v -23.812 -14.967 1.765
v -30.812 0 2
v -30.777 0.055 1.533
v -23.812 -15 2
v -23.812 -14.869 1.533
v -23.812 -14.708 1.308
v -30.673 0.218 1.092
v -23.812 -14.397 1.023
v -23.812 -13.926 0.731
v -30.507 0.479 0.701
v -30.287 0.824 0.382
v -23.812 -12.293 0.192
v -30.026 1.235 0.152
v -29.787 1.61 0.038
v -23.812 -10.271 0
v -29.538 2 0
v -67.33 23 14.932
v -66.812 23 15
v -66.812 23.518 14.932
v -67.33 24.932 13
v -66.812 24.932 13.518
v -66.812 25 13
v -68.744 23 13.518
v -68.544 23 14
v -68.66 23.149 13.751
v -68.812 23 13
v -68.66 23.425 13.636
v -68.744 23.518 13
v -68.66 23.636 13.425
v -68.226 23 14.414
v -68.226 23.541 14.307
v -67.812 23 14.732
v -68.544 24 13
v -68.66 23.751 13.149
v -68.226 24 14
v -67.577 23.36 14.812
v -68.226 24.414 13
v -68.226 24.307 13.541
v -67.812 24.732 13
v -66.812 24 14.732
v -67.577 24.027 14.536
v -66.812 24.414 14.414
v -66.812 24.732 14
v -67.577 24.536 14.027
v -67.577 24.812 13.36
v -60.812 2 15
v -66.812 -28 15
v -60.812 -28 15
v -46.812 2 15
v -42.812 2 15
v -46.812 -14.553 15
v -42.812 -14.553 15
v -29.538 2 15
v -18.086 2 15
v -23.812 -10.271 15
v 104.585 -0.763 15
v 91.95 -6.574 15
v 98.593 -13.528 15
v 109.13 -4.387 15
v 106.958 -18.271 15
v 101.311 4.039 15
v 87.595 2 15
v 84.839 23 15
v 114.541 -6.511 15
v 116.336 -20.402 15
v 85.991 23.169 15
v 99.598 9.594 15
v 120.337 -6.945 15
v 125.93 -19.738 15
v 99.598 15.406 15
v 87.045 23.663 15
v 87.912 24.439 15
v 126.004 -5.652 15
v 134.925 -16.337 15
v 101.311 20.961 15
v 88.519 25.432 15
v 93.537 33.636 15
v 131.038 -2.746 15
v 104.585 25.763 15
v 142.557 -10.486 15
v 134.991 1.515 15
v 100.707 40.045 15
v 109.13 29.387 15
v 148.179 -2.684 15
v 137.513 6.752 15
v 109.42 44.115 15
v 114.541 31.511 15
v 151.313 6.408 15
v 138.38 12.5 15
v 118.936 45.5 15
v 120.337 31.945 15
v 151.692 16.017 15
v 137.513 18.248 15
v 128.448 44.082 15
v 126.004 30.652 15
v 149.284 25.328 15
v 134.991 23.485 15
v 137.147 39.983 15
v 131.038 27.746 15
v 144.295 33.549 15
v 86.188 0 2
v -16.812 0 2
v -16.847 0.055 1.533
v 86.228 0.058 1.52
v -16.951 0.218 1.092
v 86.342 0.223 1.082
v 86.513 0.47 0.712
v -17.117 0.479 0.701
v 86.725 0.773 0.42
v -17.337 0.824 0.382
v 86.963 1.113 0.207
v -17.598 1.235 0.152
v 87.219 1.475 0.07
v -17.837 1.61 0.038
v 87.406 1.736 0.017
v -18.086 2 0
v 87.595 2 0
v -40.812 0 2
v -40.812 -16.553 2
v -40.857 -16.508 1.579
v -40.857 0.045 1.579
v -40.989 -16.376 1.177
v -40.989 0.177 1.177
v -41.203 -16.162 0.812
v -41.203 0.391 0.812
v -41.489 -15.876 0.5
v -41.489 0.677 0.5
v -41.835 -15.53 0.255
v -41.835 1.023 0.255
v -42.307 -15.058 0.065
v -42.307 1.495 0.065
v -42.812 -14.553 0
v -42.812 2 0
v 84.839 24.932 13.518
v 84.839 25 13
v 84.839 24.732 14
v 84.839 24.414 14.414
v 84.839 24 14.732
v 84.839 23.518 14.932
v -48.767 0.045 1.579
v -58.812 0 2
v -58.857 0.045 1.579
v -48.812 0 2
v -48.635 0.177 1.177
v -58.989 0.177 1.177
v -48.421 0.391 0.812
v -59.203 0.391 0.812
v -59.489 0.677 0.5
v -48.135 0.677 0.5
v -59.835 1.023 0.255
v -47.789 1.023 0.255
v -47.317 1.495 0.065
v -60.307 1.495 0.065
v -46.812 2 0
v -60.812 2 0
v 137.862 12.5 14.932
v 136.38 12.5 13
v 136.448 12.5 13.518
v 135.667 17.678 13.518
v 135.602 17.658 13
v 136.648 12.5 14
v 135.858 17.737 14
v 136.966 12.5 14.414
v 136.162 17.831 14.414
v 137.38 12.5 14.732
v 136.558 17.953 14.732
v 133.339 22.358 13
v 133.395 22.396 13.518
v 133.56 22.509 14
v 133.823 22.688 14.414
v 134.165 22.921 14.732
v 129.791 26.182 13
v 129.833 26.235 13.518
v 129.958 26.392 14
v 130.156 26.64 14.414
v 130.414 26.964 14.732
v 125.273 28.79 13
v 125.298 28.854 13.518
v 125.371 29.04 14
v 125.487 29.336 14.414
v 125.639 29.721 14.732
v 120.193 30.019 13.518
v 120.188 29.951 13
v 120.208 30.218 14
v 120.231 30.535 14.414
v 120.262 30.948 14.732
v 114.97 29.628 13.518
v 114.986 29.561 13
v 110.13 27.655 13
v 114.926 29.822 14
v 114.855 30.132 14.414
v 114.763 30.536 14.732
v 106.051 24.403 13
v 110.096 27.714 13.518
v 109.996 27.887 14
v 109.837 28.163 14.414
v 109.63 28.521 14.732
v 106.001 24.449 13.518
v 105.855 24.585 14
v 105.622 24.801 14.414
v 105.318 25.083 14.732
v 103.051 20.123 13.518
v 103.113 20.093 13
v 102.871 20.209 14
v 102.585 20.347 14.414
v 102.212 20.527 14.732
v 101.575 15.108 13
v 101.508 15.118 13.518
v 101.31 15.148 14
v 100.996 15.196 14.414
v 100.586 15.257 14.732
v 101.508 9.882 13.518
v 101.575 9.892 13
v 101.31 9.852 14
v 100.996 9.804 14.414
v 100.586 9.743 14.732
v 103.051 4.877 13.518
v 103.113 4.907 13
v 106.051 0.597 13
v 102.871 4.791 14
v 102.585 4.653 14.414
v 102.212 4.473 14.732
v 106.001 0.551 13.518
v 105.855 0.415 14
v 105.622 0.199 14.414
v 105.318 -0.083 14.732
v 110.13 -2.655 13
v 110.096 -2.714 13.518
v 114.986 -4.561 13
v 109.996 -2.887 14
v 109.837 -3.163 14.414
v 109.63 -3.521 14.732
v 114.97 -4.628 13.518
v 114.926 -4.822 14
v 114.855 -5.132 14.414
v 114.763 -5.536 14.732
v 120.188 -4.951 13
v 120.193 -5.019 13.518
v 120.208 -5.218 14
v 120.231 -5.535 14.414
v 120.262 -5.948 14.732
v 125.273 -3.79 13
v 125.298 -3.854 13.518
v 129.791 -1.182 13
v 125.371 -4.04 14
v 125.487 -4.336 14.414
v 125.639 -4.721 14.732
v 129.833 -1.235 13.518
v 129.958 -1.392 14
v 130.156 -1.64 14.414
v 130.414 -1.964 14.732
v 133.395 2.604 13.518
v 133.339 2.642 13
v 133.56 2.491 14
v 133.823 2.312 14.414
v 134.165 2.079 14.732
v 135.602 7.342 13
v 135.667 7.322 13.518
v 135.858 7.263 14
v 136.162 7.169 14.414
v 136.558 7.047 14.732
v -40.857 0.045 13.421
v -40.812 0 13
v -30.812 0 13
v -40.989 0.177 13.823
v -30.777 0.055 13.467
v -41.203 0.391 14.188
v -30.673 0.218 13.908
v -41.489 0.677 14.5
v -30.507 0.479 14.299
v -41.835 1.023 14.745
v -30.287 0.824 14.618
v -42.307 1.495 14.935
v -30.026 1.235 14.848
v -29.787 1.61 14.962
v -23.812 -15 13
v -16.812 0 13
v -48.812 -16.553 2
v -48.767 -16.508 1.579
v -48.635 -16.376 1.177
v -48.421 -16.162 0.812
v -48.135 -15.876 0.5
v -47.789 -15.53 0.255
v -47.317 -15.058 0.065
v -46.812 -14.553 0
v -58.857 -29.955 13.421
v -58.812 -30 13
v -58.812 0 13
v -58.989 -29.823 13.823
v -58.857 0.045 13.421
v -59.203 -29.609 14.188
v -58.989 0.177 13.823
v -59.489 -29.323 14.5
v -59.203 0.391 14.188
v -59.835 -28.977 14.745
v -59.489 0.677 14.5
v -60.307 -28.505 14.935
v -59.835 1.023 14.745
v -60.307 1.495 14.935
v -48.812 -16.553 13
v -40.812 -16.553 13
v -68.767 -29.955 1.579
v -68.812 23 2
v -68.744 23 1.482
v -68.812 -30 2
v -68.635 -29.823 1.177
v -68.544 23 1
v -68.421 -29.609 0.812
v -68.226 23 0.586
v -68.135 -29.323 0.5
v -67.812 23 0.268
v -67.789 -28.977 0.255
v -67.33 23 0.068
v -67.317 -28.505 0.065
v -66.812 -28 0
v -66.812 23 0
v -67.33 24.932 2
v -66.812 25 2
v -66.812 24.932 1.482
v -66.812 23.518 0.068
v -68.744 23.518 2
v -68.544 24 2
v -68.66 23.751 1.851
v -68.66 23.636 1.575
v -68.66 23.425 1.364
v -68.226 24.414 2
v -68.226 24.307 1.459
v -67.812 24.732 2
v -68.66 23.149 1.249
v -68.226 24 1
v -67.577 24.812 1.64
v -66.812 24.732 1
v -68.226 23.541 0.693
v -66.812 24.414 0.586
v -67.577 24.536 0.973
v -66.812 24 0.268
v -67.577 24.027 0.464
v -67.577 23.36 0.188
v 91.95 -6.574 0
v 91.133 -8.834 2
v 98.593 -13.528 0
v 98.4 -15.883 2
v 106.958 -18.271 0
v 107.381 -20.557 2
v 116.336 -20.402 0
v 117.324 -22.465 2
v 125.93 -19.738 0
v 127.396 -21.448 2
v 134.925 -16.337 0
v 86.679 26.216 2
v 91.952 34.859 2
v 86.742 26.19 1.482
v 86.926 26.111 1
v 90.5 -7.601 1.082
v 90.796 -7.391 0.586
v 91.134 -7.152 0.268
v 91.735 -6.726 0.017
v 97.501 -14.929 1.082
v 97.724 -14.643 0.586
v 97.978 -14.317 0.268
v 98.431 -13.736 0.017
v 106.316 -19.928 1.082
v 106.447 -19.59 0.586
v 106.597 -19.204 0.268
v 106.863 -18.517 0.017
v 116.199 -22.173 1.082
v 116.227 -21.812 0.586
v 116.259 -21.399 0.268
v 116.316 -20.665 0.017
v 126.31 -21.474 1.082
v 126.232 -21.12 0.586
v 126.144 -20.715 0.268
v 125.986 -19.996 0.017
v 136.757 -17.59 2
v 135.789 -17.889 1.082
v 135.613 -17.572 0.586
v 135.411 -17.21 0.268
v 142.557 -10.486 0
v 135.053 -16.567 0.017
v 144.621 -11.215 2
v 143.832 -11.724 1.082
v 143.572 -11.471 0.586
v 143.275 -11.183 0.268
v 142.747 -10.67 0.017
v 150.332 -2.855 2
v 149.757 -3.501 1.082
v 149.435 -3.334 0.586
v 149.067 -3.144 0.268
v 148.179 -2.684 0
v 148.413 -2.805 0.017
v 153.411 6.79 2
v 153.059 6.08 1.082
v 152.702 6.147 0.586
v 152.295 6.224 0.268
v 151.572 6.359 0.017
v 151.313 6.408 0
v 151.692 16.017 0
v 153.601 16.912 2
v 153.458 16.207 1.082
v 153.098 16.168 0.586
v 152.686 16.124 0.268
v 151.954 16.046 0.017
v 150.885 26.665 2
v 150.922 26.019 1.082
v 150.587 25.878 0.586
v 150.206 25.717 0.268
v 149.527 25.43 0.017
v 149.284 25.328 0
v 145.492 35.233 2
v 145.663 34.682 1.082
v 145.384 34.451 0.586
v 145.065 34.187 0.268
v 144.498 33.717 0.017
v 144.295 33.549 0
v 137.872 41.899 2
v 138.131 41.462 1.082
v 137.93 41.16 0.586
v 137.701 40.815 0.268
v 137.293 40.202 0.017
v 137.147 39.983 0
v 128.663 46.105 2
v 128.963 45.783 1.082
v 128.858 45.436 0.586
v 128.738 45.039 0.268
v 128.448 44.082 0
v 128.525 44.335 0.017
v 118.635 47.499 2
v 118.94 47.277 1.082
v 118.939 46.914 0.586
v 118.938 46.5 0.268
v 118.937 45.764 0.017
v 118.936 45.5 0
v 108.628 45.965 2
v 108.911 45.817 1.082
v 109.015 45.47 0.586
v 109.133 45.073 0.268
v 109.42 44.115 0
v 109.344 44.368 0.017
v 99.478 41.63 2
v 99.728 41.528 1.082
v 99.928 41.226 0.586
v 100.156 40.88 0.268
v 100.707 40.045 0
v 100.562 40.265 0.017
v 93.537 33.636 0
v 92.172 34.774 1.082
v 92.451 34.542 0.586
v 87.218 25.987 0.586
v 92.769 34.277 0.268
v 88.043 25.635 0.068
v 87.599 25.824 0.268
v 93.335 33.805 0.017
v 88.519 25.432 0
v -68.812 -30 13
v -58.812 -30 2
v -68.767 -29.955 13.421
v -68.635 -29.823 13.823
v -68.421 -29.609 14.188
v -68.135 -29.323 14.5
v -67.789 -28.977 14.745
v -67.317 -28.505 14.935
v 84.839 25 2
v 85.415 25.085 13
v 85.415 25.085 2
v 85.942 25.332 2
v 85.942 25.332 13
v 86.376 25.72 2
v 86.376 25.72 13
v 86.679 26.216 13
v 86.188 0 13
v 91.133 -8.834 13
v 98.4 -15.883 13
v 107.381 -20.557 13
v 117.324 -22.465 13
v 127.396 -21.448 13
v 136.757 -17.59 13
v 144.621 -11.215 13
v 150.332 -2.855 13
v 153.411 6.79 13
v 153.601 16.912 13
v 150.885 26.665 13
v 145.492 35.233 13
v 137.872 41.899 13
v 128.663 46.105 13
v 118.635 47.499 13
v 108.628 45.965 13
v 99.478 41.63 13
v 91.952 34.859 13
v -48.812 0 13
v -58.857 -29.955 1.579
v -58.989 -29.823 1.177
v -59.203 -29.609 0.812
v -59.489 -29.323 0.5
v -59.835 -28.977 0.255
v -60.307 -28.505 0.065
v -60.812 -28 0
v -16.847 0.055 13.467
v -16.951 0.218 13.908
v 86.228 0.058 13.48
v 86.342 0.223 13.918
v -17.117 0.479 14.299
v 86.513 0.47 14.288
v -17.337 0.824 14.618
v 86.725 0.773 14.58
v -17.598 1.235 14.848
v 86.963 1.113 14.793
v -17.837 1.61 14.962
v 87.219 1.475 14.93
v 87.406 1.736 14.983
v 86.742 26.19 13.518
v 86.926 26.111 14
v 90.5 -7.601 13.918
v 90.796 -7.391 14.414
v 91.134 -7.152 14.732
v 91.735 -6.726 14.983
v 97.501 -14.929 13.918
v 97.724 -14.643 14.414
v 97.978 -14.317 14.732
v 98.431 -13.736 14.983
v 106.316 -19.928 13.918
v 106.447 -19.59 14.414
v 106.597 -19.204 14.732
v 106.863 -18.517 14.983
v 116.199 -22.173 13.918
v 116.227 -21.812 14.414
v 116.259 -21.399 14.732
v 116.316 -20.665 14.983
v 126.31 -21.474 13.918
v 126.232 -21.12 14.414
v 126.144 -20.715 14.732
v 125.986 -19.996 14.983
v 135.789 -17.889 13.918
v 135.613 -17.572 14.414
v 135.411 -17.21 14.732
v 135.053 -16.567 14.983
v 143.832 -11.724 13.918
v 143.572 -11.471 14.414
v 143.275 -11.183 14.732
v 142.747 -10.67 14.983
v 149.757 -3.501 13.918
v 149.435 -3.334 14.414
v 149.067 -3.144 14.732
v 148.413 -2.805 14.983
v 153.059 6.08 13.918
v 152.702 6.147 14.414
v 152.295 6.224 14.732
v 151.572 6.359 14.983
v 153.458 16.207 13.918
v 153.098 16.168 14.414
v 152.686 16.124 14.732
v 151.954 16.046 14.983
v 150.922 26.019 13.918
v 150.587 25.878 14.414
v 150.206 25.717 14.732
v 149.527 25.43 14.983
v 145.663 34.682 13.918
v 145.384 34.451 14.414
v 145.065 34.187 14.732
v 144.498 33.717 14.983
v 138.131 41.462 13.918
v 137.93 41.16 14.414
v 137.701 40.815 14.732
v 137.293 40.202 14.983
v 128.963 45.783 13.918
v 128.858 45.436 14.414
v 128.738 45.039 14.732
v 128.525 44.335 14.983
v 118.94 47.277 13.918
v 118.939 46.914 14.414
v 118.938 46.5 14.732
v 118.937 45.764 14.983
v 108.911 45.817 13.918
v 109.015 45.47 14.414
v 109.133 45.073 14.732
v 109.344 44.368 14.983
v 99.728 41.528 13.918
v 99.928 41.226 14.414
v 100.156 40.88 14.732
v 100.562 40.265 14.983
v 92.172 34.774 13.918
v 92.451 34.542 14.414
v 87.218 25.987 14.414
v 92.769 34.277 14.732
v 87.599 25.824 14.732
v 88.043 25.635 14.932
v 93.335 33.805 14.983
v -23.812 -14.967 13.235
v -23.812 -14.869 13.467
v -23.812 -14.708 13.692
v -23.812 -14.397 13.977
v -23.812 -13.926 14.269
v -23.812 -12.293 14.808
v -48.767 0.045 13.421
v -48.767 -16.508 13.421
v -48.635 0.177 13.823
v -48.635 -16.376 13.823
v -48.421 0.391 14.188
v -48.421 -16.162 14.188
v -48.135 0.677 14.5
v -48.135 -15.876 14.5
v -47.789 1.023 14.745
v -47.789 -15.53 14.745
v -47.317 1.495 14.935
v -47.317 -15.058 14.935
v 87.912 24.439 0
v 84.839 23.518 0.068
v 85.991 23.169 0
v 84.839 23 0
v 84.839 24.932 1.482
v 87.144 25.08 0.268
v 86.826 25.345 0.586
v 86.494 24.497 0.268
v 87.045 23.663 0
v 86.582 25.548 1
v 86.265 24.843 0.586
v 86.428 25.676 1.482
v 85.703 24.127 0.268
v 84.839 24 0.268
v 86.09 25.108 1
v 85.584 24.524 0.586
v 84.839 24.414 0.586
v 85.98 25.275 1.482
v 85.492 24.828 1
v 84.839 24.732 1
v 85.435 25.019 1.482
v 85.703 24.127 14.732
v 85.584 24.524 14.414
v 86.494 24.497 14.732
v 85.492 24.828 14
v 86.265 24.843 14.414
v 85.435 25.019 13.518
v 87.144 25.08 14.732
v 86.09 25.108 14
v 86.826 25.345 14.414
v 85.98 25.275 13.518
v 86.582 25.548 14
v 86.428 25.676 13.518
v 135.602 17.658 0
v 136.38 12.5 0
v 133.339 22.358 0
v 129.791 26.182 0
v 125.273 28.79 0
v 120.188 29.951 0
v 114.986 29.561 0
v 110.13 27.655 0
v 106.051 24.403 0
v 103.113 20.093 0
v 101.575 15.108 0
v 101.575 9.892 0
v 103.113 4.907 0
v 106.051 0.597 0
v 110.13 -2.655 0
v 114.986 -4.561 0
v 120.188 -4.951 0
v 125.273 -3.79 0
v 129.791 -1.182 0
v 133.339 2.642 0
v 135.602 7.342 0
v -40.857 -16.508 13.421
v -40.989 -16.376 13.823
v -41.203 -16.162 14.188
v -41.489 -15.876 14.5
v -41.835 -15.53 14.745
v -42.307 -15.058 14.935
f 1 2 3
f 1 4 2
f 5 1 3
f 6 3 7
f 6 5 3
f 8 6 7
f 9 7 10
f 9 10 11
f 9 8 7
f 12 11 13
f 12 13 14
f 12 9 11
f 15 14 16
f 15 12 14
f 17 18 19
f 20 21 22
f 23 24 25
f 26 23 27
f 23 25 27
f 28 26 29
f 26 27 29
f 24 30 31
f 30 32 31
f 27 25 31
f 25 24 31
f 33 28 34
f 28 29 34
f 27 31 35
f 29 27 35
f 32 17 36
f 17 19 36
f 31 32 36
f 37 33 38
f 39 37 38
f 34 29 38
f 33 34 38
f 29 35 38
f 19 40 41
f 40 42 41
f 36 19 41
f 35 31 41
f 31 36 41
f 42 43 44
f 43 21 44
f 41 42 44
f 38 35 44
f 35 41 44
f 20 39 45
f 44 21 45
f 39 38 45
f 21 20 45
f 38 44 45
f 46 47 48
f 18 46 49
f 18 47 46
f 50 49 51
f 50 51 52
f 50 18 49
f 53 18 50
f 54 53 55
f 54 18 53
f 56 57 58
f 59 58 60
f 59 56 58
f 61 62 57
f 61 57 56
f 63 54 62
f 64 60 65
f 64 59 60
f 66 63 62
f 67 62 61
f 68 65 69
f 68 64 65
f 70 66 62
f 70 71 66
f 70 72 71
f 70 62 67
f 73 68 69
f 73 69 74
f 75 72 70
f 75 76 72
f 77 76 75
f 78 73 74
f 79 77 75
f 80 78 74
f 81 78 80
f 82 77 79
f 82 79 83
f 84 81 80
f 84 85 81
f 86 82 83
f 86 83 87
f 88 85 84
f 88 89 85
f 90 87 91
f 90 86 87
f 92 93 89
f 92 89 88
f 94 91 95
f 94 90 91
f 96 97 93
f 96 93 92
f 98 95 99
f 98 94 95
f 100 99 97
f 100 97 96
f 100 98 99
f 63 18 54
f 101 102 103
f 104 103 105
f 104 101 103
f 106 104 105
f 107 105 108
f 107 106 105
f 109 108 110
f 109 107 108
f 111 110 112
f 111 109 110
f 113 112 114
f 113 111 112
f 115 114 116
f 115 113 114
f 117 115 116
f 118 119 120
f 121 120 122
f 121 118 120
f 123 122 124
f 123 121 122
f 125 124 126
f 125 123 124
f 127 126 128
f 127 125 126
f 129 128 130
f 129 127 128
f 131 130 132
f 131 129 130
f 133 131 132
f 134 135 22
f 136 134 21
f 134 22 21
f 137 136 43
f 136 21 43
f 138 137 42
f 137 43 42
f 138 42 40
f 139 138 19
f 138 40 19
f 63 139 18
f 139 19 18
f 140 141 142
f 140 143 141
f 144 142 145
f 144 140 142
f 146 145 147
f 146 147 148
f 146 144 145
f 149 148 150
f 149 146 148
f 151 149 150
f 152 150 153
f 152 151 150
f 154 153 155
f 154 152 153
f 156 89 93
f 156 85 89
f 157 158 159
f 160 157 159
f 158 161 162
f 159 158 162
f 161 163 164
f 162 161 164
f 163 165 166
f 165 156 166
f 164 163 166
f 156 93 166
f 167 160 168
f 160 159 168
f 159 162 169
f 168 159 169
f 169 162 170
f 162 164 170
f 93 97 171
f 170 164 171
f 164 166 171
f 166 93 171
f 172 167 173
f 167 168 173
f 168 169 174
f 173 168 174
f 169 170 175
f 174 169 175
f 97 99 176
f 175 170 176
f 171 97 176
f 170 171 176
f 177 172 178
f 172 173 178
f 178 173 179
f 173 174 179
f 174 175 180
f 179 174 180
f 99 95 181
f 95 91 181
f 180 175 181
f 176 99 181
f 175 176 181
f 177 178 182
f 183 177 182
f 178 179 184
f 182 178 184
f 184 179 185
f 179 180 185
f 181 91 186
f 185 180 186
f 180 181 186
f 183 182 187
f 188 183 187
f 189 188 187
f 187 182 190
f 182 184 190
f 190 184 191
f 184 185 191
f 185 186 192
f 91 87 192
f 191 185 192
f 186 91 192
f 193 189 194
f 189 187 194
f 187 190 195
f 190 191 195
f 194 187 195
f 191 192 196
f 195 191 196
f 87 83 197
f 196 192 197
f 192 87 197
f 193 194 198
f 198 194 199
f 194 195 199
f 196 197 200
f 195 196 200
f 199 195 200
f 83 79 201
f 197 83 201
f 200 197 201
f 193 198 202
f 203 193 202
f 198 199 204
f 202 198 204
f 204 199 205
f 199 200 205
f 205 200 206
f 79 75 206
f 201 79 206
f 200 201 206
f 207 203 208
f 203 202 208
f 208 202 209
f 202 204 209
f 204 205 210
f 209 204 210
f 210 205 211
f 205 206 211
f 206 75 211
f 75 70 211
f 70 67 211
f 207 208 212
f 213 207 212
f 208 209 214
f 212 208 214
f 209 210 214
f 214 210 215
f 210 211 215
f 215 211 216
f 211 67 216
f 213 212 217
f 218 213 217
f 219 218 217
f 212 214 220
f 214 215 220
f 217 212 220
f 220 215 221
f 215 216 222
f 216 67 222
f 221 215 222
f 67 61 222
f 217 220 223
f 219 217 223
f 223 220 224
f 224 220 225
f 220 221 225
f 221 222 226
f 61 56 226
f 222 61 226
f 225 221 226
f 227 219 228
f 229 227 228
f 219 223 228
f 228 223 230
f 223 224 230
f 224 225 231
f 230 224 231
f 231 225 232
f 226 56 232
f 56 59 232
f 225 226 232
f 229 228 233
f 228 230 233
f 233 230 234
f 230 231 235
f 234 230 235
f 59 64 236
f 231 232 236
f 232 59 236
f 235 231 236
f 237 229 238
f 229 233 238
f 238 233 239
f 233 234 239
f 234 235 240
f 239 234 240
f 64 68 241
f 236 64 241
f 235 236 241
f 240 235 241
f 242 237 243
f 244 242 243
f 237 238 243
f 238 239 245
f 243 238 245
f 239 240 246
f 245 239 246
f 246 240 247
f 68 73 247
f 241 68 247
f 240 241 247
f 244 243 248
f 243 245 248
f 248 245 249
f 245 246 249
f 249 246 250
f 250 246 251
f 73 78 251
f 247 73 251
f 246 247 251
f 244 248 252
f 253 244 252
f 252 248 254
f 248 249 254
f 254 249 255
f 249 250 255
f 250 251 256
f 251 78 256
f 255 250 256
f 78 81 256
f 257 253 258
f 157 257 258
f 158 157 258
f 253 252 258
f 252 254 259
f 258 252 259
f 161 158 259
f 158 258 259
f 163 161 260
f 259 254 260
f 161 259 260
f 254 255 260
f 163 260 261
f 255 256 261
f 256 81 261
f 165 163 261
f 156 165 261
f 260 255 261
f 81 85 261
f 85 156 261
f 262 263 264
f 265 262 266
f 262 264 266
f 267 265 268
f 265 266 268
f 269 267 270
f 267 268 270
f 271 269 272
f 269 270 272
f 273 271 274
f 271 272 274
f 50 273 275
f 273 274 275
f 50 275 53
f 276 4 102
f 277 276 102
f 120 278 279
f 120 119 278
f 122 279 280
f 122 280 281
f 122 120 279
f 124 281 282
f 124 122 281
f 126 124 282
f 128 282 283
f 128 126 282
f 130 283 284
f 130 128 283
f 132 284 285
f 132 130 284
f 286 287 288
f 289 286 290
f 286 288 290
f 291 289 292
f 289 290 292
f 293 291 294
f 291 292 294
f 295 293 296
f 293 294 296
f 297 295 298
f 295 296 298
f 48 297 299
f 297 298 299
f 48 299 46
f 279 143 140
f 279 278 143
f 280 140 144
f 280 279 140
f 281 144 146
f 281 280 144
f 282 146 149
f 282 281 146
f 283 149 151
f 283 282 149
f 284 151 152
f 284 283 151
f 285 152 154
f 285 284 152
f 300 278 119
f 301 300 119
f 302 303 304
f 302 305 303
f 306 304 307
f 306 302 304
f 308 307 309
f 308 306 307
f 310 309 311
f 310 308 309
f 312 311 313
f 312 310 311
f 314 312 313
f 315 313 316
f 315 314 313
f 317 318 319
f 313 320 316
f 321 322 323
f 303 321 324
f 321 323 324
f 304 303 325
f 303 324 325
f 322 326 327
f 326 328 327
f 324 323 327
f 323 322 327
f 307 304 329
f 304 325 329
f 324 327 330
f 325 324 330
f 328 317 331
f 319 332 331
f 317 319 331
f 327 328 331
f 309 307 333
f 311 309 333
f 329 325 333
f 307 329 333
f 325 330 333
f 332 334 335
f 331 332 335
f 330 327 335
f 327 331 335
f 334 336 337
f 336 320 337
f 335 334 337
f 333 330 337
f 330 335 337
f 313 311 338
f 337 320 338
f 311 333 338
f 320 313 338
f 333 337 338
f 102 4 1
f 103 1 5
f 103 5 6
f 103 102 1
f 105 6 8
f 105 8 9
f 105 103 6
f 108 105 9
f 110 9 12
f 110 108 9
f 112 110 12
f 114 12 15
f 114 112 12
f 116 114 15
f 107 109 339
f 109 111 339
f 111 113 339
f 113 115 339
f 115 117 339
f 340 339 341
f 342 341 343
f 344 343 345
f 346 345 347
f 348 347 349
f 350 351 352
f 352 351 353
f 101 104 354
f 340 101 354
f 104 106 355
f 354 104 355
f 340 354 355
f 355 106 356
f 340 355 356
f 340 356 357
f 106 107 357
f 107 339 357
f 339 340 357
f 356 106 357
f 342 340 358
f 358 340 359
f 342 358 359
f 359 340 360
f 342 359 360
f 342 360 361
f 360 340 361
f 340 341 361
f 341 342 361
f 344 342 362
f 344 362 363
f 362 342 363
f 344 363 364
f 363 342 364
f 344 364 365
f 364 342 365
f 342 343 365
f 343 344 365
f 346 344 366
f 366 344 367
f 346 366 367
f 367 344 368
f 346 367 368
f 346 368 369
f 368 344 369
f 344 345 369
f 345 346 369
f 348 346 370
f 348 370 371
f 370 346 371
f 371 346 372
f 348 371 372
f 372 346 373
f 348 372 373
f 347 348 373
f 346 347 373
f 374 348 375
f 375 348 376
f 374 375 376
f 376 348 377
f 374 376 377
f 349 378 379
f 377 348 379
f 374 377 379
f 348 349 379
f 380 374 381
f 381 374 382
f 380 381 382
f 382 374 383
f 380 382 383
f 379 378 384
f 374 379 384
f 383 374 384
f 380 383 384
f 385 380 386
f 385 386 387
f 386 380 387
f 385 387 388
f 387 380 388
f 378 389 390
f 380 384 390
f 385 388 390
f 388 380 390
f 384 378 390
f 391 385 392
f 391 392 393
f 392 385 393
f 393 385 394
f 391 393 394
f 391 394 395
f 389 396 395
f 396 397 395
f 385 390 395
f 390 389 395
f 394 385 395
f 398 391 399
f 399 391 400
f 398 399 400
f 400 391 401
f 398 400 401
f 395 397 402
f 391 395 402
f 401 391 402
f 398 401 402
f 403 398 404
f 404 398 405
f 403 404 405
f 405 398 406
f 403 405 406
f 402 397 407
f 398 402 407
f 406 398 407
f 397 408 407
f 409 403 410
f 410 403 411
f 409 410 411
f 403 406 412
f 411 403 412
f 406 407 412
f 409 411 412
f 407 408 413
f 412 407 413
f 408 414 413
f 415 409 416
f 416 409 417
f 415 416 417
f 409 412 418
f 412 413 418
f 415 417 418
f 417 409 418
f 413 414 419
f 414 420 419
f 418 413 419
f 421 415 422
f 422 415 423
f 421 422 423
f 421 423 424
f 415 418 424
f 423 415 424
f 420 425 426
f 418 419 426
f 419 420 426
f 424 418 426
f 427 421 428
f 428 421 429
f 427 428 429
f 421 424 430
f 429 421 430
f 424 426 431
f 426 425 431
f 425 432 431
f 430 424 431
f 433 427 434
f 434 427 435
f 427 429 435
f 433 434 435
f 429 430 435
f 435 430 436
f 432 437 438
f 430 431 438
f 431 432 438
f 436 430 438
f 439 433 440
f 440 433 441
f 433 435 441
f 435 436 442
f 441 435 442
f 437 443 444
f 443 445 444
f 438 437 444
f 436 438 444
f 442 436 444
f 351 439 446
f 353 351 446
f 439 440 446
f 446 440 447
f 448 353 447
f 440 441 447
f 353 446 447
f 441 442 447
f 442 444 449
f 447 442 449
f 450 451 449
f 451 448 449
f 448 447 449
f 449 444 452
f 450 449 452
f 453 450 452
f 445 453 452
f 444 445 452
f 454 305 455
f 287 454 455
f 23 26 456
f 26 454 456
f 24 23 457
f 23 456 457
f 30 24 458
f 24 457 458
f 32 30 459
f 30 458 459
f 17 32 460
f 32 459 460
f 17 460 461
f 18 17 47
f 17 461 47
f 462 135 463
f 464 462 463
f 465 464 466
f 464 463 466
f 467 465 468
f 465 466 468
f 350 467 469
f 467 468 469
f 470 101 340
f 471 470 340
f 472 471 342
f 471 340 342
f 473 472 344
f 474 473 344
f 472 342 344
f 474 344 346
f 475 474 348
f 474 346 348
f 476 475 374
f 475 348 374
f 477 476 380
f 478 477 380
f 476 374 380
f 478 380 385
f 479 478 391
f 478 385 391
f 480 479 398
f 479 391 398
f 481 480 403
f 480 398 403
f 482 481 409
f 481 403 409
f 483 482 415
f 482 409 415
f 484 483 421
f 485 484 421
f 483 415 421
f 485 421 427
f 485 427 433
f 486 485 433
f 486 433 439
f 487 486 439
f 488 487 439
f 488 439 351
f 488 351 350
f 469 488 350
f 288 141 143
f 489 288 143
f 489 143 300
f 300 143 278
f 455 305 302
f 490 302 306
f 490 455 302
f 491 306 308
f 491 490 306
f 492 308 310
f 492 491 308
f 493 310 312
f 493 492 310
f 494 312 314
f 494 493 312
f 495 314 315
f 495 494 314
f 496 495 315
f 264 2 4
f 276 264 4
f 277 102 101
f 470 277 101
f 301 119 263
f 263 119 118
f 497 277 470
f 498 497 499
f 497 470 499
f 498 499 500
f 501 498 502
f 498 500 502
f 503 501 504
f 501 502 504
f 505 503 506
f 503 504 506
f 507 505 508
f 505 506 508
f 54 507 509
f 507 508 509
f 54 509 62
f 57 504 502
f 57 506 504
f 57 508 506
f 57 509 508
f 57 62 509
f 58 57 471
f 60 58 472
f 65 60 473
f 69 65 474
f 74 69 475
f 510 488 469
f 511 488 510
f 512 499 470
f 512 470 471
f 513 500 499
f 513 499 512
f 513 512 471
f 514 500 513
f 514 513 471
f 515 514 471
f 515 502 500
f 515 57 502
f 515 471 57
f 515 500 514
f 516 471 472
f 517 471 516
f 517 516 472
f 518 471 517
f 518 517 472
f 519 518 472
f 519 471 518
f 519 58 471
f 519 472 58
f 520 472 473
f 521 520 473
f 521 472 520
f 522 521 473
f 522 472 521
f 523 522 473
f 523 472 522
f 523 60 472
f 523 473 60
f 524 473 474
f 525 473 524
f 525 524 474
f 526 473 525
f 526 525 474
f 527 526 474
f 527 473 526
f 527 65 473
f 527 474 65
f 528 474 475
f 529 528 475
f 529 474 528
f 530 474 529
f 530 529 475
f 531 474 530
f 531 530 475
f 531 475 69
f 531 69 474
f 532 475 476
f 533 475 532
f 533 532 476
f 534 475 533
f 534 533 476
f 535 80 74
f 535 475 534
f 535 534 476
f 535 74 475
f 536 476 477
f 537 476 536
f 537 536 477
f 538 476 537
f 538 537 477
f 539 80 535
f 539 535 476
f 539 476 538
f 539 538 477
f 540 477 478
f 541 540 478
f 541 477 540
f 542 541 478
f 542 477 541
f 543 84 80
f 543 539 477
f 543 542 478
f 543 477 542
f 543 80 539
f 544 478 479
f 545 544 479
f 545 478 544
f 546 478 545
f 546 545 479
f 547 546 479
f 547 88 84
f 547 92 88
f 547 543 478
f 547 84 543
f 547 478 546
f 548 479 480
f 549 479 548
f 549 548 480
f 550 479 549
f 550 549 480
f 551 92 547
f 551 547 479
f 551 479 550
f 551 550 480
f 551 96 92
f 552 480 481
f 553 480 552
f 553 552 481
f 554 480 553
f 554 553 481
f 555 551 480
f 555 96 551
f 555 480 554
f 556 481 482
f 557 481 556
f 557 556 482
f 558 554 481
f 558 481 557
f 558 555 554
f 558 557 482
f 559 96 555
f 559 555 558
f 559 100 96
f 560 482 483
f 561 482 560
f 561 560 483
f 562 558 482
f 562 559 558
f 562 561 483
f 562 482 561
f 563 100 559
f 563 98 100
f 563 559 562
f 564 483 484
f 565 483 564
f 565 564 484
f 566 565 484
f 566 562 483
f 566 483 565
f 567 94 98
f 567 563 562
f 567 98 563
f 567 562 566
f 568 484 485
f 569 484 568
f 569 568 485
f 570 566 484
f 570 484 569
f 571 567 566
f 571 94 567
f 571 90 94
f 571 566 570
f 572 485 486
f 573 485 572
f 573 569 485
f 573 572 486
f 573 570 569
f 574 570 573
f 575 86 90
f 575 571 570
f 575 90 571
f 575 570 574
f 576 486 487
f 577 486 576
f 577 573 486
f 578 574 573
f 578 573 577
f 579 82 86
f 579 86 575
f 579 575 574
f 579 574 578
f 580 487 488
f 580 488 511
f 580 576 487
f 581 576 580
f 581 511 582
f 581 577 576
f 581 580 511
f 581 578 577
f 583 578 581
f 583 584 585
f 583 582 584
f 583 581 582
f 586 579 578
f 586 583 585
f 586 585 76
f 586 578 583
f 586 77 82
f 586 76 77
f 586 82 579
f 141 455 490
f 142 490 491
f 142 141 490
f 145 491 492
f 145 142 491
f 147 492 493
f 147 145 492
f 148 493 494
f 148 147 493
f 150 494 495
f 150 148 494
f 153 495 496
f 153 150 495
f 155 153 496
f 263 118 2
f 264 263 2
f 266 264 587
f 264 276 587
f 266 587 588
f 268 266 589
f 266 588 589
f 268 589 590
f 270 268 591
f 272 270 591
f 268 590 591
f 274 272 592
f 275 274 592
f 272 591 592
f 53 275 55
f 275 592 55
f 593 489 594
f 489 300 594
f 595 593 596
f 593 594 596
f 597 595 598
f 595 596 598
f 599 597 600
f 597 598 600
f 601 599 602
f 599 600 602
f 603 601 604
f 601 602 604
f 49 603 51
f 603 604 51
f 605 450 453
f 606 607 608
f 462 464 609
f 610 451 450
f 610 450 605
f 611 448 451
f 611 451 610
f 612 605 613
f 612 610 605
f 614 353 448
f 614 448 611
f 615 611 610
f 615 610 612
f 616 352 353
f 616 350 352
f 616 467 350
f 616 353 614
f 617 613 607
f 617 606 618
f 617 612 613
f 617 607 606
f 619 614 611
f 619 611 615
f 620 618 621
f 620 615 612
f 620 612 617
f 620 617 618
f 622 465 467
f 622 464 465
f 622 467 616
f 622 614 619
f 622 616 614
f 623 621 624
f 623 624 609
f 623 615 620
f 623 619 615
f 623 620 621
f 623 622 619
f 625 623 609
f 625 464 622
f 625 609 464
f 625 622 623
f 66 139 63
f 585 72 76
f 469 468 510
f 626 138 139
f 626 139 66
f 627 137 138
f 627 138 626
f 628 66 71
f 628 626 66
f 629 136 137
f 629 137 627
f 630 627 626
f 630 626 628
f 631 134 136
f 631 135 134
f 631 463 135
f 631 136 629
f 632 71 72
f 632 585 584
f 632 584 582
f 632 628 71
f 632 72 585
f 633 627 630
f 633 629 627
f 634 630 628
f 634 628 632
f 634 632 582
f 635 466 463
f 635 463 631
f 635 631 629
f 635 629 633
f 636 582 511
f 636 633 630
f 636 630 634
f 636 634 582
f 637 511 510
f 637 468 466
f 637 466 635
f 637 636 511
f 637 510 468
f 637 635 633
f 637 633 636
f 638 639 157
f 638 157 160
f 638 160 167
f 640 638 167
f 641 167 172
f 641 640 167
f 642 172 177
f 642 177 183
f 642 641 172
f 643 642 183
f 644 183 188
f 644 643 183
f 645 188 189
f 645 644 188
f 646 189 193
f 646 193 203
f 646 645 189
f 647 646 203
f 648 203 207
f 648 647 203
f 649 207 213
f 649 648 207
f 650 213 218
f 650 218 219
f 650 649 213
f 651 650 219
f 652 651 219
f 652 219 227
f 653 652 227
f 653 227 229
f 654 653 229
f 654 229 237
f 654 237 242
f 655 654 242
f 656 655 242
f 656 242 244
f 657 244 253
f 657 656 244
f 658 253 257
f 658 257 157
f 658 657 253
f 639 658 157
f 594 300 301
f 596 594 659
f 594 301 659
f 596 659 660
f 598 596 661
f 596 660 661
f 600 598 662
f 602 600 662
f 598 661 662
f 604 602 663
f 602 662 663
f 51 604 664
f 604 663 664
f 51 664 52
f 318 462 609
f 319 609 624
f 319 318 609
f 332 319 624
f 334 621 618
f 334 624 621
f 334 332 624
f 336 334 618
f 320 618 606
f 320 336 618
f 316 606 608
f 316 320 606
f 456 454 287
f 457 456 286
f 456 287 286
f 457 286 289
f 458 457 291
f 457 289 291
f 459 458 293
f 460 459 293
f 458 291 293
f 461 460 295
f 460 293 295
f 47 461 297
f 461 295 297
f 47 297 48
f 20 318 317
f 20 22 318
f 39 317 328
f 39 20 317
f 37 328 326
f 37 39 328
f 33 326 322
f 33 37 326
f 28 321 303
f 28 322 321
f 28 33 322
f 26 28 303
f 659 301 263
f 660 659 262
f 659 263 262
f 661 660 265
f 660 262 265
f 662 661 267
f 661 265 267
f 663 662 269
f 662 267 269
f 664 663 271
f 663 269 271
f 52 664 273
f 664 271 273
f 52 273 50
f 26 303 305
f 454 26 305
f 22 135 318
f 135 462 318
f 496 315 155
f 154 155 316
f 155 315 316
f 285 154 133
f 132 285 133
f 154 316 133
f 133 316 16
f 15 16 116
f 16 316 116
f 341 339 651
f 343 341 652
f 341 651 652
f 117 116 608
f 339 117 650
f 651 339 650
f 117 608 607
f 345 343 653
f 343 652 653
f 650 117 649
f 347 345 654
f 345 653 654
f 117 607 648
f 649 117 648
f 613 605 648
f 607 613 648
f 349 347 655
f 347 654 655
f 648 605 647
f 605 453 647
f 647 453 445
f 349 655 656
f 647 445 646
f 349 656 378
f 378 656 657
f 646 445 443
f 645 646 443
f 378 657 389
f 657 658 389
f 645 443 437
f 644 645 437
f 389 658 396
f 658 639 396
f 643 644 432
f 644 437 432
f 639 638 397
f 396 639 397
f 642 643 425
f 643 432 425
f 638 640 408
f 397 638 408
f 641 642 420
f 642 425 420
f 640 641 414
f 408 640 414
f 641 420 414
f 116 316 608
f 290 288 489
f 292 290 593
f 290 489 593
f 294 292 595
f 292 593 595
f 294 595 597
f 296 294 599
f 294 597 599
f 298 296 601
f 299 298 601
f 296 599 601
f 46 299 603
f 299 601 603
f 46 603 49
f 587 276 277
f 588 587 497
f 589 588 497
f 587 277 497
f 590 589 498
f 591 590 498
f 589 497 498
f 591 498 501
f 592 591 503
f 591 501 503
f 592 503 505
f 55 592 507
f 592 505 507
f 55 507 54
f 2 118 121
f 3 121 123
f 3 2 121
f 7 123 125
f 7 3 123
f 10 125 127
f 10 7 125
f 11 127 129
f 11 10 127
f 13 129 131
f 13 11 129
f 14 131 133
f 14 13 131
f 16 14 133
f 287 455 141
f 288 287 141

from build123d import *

# Parameters (mm, degrees)
F0_R     = 17.5
F1_DEPTH = 15
F2_R     = 2


with BuildPart() as f1:
    # F0 (on Top) → F1 (new body)
    with BuildSketch(Plane.XY):
        with BuildLine():
            Line((86.187997, 25), (-68.812003, 25))
            Line((-68.812003, 25), (-68.812003, 0))
            Line((-68.812003, 0), (-68.812003, -30))
            Line((-68.812003, -30), (-58.812003, -30))
            Line((-58.812003, -30), (-58.812003, 0))
            Line((-58.812003, 0), (-48.812003, 0))
            Line((-48.812003, 0), (-48.812003, -16.553))
            Line((-48.812003, -16.553), (-40.812003, -16.553))
            Line((-40.812003, -16.553), (-40.812003, 0))
            Line((-40.812003, 0), (-30.812003, 0))
            Line((-30.812003, 0), (-23.812003, -15))
            Line((-23.812003, -15), (-16.812003, 0))
            Line((-16.812003, 0), (86.187997, 0))
            ThreePointArc((86.187997, 0), (153.879739, 12.5), (86.187997, 25))
        make_face()
        with Locations((118.879739, 12.5)):
            Circle(F0_R, mode=Mode.SUBTRACT)
    extrude(amount=F1_DEPTH)

    # F2
    f2_edges = [f1.edges().sort_by_distance(p)[0] for p in [
        (8.687997, 25, 15),
        (-68.812003, -2.5, 15),
        (-58.812003, -15, 15),
        (-48.812003, -8.2765, 15),
        (-44.812003, -16.553, 15),
        (-27.312003, -7.5, 15),
        (34.687997, 0, 15),
        (-20.312003, -7.5, 15),
        (-40.812003, -8.2765, 15),
        (-63.812003, -30, 15),
        (-53.812003, 0, 15),
        (-35.812003, 0, 15),
        (153.879739, 12.5, 15),
        (101.379739, 12.5, 15),
        (153.879739, 12.5, 0),
        (8.687997, 25, 0),
        (86.187997, 25, 7.5),
        (-68.812003, 25, 7.5),
        (34.687997, 0, 0),
        (-20.312003, -7.5, 0),
        (-27.312003, -7.5, 0),
        (-35.812003, 0, 0),
        (-40.812003, -8.2765, 0),
        (-44.812003, -16.553, 0),
        (-48.812003, -8.2765, 0),
        (-53.812003, 0, 0),
        (-58.812003, -15, 0),
        (-63.812003, -30, 0),
        (-68.812003, -2.5, 0),
    ]]
    fillet(f2_edges, radius=F2_R)


solid = f1.part
